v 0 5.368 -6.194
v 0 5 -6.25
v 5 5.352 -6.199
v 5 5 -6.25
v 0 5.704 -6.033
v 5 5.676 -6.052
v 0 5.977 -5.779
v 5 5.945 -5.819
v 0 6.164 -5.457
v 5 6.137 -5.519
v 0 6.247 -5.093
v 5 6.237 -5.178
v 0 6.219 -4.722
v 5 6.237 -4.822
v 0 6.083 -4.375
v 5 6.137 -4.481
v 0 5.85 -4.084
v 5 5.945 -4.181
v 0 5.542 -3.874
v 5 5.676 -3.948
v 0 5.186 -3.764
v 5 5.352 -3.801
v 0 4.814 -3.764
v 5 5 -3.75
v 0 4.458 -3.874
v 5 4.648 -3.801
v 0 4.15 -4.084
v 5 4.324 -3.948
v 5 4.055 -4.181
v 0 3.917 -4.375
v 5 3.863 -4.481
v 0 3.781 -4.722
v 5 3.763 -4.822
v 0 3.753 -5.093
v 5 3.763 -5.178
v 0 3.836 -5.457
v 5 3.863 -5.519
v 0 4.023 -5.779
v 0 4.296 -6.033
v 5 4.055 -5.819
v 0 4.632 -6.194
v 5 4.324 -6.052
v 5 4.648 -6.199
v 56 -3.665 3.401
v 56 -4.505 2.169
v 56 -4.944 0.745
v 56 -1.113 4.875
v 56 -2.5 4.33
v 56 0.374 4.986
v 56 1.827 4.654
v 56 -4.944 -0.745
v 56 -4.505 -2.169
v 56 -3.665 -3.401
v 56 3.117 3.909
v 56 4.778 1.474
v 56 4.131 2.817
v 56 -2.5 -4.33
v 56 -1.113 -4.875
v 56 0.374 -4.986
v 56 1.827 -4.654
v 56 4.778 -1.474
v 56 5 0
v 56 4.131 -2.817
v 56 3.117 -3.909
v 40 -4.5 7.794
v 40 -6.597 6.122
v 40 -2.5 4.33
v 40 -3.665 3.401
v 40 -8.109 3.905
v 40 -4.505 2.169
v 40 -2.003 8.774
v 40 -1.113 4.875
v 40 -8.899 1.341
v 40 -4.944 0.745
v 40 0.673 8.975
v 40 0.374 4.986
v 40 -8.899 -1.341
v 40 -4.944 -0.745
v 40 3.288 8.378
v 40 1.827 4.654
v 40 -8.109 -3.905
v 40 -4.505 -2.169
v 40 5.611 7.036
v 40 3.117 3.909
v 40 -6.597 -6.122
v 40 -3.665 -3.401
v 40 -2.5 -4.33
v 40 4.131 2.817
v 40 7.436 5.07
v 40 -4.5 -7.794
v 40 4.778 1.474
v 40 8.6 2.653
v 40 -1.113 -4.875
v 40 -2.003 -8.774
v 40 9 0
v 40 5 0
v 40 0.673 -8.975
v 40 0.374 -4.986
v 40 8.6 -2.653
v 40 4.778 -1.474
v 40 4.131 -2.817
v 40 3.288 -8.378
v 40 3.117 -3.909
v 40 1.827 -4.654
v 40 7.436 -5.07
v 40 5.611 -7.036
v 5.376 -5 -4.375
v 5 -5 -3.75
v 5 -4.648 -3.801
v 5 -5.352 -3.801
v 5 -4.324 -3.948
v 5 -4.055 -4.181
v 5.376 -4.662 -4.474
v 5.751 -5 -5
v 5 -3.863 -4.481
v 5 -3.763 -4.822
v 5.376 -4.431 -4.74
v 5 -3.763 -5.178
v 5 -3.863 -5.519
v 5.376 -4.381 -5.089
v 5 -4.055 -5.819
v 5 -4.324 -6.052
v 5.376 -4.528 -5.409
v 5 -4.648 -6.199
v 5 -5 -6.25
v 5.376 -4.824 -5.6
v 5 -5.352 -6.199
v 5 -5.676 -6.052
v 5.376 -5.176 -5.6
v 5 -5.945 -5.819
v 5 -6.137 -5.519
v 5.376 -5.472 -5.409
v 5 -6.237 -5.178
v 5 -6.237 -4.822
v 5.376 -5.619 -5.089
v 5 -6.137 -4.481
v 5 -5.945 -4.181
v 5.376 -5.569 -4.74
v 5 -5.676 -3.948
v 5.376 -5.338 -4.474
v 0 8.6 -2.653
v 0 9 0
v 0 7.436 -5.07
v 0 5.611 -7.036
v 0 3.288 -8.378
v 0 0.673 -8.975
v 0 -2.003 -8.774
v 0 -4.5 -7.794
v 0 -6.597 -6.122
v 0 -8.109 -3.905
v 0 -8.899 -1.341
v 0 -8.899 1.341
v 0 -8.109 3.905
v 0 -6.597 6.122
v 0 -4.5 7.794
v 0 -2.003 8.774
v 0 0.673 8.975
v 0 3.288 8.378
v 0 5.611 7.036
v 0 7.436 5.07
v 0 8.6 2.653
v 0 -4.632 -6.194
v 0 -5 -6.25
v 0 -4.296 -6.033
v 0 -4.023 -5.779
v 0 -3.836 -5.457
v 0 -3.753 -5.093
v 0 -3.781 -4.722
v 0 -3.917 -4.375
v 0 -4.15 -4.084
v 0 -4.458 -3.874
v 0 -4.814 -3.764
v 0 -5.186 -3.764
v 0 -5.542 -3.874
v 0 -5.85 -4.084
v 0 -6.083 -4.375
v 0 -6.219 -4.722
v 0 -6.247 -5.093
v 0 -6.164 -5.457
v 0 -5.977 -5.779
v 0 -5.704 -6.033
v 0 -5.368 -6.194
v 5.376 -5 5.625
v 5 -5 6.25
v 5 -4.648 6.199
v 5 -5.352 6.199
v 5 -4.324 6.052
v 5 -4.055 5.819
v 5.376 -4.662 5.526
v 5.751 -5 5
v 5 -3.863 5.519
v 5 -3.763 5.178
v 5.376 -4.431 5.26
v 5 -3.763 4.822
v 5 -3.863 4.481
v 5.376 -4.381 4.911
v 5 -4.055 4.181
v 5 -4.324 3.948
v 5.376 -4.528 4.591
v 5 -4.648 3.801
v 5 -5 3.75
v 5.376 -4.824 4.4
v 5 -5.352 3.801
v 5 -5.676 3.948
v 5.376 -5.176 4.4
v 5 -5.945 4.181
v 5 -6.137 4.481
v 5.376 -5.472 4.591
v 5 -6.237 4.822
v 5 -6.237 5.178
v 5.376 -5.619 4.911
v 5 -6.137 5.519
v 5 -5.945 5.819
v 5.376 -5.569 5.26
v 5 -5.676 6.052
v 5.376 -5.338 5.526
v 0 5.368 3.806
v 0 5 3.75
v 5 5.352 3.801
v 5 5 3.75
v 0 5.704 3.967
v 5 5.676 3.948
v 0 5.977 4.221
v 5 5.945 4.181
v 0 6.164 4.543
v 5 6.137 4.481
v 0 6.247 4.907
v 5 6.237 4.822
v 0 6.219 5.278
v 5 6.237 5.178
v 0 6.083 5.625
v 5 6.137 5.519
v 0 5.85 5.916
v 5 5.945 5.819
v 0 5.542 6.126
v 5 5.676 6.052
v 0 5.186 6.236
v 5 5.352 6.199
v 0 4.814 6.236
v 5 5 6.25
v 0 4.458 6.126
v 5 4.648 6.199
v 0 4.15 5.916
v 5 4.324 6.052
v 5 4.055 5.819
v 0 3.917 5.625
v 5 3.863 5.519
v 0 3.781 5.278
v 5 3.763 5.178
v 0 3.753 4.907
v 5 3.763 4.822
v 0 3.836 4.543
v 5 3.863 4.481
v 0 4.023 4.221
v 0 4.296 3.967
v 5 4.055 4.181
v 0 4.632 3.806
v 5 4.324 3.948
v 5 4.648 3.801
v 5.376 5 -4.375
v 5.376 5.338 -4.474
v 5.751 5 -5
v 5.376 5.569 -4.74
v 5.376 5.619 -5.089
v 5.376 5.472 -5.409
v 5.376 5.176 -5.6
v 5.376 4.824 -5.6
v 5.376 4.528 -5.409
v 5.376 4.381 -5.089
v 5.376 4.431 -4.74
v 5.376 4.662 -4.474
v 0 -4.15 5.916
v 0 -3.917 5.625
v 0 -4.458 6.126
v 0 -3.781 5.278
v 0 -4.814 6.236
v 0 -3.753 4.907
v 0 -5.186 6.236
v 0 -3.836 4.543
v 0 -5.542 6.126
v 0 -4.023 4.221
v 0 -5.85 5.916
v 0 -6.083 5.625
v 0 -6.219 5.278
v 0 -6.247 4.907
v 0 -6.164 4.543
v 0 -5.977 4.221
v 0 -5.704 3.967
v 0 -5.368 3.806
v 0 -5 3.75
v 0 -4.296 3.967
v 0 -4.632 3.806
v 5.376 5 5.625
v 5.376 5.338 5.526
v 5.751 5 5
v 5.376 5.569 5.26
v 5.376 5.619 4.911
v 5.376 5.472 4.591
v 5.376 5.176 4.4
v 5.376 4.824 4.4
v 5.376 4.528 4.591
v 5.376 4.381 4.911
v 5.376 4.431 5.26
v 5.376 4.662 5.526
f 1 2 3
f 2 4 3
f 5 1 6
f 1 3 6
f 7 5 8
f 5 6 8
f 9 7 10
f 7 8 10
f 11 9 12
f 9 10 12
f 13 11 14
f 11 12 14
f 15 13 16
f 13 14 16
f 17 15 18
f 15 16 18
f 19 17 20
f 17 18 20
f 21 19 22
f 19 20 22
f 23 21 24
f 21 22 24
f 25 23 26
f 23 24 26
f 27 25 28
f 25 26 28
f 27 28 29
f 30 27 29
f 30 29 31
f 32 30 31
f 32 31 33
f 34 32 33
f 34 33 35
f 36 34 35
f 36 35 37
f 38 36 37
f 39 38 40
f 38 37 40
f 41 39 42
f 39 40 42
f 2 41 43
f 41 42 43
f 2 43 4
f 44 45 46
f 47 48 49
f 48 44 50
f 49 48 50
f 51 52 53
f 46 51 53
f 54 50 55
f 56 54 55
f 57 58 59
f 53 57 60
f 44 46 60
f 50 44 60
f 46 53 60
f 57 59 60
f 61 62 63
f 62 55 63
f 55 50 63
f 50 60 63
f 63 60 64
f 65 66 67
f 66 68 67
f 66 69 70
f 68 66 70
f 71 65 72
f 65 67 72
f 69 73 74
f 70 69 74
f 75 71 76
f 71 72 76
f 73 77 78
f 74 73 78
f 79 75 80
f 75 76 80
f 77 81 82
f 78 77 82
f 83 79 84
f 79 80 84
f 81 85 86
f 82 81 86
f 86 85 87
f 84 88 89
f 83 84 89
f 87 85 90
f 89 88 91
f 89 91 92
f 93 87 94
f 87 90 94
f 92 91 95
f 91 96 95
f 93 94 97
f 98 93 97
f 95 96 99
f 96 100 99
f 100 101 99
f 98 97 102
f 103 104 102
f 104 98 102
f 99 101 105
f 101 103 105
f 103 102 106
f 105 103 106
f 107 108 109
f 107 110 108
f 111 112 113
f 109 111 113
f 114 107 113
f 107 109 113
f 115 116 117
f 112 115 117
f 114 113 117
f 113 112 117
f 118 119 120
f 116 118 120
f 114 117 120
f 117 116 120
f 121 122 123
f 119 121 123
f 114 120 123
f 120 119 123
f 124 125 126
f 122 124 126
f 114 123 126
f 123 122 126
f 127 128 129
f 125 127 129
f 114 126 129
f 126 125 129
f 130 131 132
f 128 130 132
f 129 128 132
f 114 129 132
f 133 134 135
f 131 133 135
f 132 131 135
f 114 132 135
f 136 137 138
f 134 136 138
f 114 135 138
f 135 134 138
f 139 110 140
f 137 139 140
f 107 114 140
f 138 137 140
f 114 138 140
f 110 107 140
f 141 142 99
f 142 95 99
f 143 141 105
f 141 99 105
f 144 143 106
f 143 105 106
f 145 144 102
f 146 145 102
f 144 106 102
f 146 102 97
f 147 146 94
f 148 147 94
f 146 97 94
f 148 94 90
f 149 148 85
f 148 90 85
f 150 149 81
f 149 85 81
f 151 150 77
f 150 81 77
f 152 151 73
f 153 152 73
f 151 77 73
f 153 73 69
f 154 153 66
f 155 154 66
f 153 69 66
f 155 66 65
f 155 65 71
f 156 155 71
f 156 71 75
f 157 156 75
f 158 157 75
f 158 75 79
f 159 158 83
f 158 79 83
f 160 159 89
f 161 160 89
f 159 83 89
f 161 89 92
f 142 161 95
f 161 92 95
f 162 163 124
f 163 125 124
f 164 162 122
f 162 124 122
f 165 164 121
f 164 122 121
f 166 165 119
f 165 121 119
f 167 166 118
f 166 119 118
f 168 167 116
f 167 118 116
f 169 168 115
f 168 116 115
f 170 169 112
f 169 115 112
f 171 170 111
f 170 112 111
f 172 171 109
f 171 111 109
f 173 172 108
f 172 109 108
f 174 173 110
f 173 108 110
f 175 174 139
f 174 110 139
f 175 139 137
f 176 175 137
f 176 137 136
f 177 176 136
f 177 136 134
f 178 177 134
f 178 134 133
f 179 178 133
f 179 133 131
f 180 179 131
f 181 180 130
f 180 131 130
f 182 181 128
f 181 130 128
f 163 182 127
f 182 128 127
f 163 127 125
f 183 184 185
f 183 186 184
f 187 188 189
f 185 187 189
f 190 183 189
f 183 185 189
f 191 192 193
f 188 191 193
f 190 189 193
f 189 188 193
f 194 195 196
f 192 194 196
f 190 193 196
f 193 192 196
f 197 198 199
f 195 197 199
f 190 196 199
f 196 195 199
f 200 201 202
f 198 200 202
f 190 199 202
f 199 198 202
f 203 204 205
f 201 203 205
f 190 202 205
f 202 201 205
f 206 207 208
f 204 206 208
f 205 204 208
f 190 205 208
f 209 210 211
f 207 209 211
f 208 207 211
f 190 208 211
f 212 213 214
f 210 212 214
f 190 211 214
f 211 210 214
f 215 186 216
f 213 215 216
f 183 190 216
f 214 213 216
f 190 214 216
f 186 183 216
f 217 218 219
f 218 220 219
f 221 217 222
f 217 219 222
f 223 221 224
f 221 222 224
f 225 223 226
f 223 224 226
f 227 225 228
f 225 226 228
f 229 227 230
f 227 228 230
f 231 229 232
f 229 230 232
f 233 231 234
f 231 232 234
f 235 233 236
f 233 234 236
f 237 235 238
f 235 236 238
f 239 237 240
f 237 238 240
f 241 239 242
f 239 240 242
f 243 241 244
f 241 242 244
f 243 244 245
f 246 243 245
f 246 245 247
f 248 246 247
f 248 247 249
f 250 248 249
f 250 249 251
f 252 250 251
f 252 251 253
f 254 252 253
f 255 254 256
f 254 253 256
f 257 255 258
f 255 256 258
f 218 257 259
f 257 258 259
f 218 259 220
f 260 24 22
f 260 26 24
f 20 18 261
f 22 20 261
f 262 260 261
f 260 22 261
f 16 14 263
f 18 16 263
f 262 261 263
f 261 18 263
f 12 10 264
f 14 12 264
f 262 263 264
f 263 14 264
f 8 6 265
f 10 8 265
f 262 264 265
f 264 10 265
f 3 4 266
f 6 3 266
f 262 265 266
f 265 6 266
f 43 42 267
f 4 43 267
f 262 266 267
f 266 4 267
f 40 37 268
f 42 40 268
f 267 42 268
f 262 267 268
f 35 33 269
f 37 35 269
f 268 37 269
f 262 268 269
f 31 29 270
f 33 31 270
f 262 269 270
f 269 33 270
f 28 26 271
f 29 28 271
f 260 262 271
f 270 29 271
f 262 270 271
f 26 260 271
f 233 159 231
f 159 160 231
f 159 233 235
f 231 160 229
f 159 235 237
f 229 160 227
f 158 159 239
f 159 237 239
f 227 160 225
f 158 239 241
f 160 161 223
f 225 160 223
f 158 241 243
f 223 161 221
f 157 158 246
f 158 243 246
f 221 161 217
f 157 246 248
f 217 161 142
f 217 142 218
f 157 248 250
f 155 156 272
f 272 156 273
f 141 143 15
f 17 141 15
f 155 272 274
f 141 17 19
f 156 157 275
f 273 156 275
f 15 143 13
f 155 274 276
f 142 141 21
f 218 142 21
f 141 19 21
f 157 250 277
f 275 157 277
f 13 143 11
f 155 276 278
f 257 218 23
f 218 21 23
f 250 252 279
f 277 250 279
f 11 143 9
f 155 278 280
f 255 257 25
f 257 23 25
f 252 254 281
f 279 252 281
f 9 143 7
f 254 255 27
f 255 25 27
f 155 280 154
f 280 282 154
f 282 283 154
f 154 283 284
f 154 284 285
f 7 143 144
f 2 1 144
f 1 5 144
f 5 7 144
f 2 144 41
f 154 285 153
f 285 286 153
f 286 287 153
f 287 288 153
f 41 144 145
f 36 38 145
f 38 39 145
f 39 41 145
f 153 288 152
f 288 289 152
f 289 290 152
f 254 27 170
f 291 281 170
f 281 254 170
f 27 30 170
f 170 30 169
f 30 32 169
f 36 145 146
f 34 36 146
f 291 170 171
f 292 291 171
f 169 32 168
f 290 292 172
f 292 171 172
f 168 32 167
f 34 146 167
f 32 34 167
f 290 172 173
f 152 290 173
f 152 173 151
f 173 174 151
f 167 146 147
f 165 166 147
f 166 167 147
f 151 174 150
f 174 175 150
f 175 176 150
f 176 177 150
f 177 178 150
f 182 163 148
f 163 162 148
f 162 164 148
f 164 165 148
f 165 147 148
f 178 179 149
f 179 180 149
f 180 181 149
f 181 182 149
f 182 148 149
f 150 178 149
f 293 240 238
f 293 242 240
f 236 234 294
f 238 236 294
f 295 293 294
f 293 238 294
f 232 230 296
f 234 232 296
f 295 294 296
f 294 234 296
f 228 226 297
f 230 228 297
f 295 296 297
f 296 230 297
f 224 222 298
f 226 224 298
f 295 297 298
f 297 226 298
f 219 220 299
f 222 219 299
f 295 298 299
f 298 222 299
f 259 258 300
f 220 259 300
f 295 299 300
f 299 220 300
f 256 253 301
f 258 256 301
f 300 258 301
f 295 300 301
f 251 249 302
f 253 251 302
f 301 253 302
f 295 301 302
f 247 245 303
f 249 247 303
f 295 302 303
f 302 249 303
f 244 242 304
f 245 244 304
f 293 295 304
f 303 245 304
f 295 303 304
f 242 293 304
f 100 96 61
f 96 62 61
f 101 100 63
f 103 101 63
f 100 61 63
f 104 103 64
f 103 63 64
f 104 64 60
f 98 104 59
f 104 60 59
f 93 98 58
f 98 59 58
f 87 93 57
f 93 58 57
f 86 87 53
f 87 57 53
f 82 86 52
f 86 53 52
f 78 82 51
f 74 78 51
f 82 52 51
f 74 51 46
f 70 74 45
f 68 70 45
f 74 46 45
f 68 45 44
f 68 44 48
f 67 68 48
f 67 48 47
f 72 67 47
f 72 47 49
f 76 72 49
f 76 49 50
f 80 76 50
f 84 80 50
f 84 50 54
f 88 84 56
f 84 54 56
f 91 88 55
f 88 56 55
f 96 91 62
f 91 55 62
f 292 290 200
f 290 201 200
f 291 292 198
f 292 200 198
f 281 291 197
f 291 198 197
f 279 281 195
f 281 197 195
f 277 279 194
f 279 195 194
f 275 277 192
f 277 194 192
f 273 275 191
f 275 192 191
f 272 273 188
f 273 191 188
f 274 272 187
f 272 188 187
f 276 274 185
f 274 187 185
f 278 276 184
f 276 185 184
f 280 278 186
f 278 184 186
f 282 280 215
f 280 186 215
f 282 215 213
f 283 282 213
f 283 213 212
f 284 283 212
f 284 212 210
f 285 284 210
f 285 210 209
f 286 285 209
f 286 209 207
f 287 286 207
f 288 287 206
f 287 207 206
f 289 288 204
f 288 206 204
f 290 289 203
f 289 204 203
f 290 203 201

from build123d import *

# Parameters (mm, degrees)
HOLE_WIZARD_M3_1_D     = 2.5
HOLE_WIZARD_M3_1_DEPTH = 5
HOLE_WIZARD_M3_1_TIP   = 0.751075774


with BuildPart() as part:
    # 草图2 → 旋转1 (revolve)
    with BuildSketch(Plane.XY):
        Polygon((0, 0), (0, 9), (40, 9), (40, 5), (56, 5), (56, 0), align=None)
    revolve(axis=Axis((56, 0, 0), (-1, 0, 0)))

    # M3 螺纹孔1
    with Locations(Plane.ZY):
        with Locations((-5, 5), (5, 5), (5, -5), (-5, -5)):
            Hole(HOLE_WIZARD_M3_1_D / 2, depth=HOLE_WIZARD_M3_1_DEPTH)
            with Locations((0, 0, -(HOLE_WIZARD_M3_1_DEPTH + HOLE_WIZARD_M3_1_TIP / 2))):  # 118° drill point
                Cone(0, HOLE_WIZARD_M3_1_D / 2, HOLE_WIZARD_M3_1_TIP, mode=Mode.SUBTRACT)


solid = part.part
